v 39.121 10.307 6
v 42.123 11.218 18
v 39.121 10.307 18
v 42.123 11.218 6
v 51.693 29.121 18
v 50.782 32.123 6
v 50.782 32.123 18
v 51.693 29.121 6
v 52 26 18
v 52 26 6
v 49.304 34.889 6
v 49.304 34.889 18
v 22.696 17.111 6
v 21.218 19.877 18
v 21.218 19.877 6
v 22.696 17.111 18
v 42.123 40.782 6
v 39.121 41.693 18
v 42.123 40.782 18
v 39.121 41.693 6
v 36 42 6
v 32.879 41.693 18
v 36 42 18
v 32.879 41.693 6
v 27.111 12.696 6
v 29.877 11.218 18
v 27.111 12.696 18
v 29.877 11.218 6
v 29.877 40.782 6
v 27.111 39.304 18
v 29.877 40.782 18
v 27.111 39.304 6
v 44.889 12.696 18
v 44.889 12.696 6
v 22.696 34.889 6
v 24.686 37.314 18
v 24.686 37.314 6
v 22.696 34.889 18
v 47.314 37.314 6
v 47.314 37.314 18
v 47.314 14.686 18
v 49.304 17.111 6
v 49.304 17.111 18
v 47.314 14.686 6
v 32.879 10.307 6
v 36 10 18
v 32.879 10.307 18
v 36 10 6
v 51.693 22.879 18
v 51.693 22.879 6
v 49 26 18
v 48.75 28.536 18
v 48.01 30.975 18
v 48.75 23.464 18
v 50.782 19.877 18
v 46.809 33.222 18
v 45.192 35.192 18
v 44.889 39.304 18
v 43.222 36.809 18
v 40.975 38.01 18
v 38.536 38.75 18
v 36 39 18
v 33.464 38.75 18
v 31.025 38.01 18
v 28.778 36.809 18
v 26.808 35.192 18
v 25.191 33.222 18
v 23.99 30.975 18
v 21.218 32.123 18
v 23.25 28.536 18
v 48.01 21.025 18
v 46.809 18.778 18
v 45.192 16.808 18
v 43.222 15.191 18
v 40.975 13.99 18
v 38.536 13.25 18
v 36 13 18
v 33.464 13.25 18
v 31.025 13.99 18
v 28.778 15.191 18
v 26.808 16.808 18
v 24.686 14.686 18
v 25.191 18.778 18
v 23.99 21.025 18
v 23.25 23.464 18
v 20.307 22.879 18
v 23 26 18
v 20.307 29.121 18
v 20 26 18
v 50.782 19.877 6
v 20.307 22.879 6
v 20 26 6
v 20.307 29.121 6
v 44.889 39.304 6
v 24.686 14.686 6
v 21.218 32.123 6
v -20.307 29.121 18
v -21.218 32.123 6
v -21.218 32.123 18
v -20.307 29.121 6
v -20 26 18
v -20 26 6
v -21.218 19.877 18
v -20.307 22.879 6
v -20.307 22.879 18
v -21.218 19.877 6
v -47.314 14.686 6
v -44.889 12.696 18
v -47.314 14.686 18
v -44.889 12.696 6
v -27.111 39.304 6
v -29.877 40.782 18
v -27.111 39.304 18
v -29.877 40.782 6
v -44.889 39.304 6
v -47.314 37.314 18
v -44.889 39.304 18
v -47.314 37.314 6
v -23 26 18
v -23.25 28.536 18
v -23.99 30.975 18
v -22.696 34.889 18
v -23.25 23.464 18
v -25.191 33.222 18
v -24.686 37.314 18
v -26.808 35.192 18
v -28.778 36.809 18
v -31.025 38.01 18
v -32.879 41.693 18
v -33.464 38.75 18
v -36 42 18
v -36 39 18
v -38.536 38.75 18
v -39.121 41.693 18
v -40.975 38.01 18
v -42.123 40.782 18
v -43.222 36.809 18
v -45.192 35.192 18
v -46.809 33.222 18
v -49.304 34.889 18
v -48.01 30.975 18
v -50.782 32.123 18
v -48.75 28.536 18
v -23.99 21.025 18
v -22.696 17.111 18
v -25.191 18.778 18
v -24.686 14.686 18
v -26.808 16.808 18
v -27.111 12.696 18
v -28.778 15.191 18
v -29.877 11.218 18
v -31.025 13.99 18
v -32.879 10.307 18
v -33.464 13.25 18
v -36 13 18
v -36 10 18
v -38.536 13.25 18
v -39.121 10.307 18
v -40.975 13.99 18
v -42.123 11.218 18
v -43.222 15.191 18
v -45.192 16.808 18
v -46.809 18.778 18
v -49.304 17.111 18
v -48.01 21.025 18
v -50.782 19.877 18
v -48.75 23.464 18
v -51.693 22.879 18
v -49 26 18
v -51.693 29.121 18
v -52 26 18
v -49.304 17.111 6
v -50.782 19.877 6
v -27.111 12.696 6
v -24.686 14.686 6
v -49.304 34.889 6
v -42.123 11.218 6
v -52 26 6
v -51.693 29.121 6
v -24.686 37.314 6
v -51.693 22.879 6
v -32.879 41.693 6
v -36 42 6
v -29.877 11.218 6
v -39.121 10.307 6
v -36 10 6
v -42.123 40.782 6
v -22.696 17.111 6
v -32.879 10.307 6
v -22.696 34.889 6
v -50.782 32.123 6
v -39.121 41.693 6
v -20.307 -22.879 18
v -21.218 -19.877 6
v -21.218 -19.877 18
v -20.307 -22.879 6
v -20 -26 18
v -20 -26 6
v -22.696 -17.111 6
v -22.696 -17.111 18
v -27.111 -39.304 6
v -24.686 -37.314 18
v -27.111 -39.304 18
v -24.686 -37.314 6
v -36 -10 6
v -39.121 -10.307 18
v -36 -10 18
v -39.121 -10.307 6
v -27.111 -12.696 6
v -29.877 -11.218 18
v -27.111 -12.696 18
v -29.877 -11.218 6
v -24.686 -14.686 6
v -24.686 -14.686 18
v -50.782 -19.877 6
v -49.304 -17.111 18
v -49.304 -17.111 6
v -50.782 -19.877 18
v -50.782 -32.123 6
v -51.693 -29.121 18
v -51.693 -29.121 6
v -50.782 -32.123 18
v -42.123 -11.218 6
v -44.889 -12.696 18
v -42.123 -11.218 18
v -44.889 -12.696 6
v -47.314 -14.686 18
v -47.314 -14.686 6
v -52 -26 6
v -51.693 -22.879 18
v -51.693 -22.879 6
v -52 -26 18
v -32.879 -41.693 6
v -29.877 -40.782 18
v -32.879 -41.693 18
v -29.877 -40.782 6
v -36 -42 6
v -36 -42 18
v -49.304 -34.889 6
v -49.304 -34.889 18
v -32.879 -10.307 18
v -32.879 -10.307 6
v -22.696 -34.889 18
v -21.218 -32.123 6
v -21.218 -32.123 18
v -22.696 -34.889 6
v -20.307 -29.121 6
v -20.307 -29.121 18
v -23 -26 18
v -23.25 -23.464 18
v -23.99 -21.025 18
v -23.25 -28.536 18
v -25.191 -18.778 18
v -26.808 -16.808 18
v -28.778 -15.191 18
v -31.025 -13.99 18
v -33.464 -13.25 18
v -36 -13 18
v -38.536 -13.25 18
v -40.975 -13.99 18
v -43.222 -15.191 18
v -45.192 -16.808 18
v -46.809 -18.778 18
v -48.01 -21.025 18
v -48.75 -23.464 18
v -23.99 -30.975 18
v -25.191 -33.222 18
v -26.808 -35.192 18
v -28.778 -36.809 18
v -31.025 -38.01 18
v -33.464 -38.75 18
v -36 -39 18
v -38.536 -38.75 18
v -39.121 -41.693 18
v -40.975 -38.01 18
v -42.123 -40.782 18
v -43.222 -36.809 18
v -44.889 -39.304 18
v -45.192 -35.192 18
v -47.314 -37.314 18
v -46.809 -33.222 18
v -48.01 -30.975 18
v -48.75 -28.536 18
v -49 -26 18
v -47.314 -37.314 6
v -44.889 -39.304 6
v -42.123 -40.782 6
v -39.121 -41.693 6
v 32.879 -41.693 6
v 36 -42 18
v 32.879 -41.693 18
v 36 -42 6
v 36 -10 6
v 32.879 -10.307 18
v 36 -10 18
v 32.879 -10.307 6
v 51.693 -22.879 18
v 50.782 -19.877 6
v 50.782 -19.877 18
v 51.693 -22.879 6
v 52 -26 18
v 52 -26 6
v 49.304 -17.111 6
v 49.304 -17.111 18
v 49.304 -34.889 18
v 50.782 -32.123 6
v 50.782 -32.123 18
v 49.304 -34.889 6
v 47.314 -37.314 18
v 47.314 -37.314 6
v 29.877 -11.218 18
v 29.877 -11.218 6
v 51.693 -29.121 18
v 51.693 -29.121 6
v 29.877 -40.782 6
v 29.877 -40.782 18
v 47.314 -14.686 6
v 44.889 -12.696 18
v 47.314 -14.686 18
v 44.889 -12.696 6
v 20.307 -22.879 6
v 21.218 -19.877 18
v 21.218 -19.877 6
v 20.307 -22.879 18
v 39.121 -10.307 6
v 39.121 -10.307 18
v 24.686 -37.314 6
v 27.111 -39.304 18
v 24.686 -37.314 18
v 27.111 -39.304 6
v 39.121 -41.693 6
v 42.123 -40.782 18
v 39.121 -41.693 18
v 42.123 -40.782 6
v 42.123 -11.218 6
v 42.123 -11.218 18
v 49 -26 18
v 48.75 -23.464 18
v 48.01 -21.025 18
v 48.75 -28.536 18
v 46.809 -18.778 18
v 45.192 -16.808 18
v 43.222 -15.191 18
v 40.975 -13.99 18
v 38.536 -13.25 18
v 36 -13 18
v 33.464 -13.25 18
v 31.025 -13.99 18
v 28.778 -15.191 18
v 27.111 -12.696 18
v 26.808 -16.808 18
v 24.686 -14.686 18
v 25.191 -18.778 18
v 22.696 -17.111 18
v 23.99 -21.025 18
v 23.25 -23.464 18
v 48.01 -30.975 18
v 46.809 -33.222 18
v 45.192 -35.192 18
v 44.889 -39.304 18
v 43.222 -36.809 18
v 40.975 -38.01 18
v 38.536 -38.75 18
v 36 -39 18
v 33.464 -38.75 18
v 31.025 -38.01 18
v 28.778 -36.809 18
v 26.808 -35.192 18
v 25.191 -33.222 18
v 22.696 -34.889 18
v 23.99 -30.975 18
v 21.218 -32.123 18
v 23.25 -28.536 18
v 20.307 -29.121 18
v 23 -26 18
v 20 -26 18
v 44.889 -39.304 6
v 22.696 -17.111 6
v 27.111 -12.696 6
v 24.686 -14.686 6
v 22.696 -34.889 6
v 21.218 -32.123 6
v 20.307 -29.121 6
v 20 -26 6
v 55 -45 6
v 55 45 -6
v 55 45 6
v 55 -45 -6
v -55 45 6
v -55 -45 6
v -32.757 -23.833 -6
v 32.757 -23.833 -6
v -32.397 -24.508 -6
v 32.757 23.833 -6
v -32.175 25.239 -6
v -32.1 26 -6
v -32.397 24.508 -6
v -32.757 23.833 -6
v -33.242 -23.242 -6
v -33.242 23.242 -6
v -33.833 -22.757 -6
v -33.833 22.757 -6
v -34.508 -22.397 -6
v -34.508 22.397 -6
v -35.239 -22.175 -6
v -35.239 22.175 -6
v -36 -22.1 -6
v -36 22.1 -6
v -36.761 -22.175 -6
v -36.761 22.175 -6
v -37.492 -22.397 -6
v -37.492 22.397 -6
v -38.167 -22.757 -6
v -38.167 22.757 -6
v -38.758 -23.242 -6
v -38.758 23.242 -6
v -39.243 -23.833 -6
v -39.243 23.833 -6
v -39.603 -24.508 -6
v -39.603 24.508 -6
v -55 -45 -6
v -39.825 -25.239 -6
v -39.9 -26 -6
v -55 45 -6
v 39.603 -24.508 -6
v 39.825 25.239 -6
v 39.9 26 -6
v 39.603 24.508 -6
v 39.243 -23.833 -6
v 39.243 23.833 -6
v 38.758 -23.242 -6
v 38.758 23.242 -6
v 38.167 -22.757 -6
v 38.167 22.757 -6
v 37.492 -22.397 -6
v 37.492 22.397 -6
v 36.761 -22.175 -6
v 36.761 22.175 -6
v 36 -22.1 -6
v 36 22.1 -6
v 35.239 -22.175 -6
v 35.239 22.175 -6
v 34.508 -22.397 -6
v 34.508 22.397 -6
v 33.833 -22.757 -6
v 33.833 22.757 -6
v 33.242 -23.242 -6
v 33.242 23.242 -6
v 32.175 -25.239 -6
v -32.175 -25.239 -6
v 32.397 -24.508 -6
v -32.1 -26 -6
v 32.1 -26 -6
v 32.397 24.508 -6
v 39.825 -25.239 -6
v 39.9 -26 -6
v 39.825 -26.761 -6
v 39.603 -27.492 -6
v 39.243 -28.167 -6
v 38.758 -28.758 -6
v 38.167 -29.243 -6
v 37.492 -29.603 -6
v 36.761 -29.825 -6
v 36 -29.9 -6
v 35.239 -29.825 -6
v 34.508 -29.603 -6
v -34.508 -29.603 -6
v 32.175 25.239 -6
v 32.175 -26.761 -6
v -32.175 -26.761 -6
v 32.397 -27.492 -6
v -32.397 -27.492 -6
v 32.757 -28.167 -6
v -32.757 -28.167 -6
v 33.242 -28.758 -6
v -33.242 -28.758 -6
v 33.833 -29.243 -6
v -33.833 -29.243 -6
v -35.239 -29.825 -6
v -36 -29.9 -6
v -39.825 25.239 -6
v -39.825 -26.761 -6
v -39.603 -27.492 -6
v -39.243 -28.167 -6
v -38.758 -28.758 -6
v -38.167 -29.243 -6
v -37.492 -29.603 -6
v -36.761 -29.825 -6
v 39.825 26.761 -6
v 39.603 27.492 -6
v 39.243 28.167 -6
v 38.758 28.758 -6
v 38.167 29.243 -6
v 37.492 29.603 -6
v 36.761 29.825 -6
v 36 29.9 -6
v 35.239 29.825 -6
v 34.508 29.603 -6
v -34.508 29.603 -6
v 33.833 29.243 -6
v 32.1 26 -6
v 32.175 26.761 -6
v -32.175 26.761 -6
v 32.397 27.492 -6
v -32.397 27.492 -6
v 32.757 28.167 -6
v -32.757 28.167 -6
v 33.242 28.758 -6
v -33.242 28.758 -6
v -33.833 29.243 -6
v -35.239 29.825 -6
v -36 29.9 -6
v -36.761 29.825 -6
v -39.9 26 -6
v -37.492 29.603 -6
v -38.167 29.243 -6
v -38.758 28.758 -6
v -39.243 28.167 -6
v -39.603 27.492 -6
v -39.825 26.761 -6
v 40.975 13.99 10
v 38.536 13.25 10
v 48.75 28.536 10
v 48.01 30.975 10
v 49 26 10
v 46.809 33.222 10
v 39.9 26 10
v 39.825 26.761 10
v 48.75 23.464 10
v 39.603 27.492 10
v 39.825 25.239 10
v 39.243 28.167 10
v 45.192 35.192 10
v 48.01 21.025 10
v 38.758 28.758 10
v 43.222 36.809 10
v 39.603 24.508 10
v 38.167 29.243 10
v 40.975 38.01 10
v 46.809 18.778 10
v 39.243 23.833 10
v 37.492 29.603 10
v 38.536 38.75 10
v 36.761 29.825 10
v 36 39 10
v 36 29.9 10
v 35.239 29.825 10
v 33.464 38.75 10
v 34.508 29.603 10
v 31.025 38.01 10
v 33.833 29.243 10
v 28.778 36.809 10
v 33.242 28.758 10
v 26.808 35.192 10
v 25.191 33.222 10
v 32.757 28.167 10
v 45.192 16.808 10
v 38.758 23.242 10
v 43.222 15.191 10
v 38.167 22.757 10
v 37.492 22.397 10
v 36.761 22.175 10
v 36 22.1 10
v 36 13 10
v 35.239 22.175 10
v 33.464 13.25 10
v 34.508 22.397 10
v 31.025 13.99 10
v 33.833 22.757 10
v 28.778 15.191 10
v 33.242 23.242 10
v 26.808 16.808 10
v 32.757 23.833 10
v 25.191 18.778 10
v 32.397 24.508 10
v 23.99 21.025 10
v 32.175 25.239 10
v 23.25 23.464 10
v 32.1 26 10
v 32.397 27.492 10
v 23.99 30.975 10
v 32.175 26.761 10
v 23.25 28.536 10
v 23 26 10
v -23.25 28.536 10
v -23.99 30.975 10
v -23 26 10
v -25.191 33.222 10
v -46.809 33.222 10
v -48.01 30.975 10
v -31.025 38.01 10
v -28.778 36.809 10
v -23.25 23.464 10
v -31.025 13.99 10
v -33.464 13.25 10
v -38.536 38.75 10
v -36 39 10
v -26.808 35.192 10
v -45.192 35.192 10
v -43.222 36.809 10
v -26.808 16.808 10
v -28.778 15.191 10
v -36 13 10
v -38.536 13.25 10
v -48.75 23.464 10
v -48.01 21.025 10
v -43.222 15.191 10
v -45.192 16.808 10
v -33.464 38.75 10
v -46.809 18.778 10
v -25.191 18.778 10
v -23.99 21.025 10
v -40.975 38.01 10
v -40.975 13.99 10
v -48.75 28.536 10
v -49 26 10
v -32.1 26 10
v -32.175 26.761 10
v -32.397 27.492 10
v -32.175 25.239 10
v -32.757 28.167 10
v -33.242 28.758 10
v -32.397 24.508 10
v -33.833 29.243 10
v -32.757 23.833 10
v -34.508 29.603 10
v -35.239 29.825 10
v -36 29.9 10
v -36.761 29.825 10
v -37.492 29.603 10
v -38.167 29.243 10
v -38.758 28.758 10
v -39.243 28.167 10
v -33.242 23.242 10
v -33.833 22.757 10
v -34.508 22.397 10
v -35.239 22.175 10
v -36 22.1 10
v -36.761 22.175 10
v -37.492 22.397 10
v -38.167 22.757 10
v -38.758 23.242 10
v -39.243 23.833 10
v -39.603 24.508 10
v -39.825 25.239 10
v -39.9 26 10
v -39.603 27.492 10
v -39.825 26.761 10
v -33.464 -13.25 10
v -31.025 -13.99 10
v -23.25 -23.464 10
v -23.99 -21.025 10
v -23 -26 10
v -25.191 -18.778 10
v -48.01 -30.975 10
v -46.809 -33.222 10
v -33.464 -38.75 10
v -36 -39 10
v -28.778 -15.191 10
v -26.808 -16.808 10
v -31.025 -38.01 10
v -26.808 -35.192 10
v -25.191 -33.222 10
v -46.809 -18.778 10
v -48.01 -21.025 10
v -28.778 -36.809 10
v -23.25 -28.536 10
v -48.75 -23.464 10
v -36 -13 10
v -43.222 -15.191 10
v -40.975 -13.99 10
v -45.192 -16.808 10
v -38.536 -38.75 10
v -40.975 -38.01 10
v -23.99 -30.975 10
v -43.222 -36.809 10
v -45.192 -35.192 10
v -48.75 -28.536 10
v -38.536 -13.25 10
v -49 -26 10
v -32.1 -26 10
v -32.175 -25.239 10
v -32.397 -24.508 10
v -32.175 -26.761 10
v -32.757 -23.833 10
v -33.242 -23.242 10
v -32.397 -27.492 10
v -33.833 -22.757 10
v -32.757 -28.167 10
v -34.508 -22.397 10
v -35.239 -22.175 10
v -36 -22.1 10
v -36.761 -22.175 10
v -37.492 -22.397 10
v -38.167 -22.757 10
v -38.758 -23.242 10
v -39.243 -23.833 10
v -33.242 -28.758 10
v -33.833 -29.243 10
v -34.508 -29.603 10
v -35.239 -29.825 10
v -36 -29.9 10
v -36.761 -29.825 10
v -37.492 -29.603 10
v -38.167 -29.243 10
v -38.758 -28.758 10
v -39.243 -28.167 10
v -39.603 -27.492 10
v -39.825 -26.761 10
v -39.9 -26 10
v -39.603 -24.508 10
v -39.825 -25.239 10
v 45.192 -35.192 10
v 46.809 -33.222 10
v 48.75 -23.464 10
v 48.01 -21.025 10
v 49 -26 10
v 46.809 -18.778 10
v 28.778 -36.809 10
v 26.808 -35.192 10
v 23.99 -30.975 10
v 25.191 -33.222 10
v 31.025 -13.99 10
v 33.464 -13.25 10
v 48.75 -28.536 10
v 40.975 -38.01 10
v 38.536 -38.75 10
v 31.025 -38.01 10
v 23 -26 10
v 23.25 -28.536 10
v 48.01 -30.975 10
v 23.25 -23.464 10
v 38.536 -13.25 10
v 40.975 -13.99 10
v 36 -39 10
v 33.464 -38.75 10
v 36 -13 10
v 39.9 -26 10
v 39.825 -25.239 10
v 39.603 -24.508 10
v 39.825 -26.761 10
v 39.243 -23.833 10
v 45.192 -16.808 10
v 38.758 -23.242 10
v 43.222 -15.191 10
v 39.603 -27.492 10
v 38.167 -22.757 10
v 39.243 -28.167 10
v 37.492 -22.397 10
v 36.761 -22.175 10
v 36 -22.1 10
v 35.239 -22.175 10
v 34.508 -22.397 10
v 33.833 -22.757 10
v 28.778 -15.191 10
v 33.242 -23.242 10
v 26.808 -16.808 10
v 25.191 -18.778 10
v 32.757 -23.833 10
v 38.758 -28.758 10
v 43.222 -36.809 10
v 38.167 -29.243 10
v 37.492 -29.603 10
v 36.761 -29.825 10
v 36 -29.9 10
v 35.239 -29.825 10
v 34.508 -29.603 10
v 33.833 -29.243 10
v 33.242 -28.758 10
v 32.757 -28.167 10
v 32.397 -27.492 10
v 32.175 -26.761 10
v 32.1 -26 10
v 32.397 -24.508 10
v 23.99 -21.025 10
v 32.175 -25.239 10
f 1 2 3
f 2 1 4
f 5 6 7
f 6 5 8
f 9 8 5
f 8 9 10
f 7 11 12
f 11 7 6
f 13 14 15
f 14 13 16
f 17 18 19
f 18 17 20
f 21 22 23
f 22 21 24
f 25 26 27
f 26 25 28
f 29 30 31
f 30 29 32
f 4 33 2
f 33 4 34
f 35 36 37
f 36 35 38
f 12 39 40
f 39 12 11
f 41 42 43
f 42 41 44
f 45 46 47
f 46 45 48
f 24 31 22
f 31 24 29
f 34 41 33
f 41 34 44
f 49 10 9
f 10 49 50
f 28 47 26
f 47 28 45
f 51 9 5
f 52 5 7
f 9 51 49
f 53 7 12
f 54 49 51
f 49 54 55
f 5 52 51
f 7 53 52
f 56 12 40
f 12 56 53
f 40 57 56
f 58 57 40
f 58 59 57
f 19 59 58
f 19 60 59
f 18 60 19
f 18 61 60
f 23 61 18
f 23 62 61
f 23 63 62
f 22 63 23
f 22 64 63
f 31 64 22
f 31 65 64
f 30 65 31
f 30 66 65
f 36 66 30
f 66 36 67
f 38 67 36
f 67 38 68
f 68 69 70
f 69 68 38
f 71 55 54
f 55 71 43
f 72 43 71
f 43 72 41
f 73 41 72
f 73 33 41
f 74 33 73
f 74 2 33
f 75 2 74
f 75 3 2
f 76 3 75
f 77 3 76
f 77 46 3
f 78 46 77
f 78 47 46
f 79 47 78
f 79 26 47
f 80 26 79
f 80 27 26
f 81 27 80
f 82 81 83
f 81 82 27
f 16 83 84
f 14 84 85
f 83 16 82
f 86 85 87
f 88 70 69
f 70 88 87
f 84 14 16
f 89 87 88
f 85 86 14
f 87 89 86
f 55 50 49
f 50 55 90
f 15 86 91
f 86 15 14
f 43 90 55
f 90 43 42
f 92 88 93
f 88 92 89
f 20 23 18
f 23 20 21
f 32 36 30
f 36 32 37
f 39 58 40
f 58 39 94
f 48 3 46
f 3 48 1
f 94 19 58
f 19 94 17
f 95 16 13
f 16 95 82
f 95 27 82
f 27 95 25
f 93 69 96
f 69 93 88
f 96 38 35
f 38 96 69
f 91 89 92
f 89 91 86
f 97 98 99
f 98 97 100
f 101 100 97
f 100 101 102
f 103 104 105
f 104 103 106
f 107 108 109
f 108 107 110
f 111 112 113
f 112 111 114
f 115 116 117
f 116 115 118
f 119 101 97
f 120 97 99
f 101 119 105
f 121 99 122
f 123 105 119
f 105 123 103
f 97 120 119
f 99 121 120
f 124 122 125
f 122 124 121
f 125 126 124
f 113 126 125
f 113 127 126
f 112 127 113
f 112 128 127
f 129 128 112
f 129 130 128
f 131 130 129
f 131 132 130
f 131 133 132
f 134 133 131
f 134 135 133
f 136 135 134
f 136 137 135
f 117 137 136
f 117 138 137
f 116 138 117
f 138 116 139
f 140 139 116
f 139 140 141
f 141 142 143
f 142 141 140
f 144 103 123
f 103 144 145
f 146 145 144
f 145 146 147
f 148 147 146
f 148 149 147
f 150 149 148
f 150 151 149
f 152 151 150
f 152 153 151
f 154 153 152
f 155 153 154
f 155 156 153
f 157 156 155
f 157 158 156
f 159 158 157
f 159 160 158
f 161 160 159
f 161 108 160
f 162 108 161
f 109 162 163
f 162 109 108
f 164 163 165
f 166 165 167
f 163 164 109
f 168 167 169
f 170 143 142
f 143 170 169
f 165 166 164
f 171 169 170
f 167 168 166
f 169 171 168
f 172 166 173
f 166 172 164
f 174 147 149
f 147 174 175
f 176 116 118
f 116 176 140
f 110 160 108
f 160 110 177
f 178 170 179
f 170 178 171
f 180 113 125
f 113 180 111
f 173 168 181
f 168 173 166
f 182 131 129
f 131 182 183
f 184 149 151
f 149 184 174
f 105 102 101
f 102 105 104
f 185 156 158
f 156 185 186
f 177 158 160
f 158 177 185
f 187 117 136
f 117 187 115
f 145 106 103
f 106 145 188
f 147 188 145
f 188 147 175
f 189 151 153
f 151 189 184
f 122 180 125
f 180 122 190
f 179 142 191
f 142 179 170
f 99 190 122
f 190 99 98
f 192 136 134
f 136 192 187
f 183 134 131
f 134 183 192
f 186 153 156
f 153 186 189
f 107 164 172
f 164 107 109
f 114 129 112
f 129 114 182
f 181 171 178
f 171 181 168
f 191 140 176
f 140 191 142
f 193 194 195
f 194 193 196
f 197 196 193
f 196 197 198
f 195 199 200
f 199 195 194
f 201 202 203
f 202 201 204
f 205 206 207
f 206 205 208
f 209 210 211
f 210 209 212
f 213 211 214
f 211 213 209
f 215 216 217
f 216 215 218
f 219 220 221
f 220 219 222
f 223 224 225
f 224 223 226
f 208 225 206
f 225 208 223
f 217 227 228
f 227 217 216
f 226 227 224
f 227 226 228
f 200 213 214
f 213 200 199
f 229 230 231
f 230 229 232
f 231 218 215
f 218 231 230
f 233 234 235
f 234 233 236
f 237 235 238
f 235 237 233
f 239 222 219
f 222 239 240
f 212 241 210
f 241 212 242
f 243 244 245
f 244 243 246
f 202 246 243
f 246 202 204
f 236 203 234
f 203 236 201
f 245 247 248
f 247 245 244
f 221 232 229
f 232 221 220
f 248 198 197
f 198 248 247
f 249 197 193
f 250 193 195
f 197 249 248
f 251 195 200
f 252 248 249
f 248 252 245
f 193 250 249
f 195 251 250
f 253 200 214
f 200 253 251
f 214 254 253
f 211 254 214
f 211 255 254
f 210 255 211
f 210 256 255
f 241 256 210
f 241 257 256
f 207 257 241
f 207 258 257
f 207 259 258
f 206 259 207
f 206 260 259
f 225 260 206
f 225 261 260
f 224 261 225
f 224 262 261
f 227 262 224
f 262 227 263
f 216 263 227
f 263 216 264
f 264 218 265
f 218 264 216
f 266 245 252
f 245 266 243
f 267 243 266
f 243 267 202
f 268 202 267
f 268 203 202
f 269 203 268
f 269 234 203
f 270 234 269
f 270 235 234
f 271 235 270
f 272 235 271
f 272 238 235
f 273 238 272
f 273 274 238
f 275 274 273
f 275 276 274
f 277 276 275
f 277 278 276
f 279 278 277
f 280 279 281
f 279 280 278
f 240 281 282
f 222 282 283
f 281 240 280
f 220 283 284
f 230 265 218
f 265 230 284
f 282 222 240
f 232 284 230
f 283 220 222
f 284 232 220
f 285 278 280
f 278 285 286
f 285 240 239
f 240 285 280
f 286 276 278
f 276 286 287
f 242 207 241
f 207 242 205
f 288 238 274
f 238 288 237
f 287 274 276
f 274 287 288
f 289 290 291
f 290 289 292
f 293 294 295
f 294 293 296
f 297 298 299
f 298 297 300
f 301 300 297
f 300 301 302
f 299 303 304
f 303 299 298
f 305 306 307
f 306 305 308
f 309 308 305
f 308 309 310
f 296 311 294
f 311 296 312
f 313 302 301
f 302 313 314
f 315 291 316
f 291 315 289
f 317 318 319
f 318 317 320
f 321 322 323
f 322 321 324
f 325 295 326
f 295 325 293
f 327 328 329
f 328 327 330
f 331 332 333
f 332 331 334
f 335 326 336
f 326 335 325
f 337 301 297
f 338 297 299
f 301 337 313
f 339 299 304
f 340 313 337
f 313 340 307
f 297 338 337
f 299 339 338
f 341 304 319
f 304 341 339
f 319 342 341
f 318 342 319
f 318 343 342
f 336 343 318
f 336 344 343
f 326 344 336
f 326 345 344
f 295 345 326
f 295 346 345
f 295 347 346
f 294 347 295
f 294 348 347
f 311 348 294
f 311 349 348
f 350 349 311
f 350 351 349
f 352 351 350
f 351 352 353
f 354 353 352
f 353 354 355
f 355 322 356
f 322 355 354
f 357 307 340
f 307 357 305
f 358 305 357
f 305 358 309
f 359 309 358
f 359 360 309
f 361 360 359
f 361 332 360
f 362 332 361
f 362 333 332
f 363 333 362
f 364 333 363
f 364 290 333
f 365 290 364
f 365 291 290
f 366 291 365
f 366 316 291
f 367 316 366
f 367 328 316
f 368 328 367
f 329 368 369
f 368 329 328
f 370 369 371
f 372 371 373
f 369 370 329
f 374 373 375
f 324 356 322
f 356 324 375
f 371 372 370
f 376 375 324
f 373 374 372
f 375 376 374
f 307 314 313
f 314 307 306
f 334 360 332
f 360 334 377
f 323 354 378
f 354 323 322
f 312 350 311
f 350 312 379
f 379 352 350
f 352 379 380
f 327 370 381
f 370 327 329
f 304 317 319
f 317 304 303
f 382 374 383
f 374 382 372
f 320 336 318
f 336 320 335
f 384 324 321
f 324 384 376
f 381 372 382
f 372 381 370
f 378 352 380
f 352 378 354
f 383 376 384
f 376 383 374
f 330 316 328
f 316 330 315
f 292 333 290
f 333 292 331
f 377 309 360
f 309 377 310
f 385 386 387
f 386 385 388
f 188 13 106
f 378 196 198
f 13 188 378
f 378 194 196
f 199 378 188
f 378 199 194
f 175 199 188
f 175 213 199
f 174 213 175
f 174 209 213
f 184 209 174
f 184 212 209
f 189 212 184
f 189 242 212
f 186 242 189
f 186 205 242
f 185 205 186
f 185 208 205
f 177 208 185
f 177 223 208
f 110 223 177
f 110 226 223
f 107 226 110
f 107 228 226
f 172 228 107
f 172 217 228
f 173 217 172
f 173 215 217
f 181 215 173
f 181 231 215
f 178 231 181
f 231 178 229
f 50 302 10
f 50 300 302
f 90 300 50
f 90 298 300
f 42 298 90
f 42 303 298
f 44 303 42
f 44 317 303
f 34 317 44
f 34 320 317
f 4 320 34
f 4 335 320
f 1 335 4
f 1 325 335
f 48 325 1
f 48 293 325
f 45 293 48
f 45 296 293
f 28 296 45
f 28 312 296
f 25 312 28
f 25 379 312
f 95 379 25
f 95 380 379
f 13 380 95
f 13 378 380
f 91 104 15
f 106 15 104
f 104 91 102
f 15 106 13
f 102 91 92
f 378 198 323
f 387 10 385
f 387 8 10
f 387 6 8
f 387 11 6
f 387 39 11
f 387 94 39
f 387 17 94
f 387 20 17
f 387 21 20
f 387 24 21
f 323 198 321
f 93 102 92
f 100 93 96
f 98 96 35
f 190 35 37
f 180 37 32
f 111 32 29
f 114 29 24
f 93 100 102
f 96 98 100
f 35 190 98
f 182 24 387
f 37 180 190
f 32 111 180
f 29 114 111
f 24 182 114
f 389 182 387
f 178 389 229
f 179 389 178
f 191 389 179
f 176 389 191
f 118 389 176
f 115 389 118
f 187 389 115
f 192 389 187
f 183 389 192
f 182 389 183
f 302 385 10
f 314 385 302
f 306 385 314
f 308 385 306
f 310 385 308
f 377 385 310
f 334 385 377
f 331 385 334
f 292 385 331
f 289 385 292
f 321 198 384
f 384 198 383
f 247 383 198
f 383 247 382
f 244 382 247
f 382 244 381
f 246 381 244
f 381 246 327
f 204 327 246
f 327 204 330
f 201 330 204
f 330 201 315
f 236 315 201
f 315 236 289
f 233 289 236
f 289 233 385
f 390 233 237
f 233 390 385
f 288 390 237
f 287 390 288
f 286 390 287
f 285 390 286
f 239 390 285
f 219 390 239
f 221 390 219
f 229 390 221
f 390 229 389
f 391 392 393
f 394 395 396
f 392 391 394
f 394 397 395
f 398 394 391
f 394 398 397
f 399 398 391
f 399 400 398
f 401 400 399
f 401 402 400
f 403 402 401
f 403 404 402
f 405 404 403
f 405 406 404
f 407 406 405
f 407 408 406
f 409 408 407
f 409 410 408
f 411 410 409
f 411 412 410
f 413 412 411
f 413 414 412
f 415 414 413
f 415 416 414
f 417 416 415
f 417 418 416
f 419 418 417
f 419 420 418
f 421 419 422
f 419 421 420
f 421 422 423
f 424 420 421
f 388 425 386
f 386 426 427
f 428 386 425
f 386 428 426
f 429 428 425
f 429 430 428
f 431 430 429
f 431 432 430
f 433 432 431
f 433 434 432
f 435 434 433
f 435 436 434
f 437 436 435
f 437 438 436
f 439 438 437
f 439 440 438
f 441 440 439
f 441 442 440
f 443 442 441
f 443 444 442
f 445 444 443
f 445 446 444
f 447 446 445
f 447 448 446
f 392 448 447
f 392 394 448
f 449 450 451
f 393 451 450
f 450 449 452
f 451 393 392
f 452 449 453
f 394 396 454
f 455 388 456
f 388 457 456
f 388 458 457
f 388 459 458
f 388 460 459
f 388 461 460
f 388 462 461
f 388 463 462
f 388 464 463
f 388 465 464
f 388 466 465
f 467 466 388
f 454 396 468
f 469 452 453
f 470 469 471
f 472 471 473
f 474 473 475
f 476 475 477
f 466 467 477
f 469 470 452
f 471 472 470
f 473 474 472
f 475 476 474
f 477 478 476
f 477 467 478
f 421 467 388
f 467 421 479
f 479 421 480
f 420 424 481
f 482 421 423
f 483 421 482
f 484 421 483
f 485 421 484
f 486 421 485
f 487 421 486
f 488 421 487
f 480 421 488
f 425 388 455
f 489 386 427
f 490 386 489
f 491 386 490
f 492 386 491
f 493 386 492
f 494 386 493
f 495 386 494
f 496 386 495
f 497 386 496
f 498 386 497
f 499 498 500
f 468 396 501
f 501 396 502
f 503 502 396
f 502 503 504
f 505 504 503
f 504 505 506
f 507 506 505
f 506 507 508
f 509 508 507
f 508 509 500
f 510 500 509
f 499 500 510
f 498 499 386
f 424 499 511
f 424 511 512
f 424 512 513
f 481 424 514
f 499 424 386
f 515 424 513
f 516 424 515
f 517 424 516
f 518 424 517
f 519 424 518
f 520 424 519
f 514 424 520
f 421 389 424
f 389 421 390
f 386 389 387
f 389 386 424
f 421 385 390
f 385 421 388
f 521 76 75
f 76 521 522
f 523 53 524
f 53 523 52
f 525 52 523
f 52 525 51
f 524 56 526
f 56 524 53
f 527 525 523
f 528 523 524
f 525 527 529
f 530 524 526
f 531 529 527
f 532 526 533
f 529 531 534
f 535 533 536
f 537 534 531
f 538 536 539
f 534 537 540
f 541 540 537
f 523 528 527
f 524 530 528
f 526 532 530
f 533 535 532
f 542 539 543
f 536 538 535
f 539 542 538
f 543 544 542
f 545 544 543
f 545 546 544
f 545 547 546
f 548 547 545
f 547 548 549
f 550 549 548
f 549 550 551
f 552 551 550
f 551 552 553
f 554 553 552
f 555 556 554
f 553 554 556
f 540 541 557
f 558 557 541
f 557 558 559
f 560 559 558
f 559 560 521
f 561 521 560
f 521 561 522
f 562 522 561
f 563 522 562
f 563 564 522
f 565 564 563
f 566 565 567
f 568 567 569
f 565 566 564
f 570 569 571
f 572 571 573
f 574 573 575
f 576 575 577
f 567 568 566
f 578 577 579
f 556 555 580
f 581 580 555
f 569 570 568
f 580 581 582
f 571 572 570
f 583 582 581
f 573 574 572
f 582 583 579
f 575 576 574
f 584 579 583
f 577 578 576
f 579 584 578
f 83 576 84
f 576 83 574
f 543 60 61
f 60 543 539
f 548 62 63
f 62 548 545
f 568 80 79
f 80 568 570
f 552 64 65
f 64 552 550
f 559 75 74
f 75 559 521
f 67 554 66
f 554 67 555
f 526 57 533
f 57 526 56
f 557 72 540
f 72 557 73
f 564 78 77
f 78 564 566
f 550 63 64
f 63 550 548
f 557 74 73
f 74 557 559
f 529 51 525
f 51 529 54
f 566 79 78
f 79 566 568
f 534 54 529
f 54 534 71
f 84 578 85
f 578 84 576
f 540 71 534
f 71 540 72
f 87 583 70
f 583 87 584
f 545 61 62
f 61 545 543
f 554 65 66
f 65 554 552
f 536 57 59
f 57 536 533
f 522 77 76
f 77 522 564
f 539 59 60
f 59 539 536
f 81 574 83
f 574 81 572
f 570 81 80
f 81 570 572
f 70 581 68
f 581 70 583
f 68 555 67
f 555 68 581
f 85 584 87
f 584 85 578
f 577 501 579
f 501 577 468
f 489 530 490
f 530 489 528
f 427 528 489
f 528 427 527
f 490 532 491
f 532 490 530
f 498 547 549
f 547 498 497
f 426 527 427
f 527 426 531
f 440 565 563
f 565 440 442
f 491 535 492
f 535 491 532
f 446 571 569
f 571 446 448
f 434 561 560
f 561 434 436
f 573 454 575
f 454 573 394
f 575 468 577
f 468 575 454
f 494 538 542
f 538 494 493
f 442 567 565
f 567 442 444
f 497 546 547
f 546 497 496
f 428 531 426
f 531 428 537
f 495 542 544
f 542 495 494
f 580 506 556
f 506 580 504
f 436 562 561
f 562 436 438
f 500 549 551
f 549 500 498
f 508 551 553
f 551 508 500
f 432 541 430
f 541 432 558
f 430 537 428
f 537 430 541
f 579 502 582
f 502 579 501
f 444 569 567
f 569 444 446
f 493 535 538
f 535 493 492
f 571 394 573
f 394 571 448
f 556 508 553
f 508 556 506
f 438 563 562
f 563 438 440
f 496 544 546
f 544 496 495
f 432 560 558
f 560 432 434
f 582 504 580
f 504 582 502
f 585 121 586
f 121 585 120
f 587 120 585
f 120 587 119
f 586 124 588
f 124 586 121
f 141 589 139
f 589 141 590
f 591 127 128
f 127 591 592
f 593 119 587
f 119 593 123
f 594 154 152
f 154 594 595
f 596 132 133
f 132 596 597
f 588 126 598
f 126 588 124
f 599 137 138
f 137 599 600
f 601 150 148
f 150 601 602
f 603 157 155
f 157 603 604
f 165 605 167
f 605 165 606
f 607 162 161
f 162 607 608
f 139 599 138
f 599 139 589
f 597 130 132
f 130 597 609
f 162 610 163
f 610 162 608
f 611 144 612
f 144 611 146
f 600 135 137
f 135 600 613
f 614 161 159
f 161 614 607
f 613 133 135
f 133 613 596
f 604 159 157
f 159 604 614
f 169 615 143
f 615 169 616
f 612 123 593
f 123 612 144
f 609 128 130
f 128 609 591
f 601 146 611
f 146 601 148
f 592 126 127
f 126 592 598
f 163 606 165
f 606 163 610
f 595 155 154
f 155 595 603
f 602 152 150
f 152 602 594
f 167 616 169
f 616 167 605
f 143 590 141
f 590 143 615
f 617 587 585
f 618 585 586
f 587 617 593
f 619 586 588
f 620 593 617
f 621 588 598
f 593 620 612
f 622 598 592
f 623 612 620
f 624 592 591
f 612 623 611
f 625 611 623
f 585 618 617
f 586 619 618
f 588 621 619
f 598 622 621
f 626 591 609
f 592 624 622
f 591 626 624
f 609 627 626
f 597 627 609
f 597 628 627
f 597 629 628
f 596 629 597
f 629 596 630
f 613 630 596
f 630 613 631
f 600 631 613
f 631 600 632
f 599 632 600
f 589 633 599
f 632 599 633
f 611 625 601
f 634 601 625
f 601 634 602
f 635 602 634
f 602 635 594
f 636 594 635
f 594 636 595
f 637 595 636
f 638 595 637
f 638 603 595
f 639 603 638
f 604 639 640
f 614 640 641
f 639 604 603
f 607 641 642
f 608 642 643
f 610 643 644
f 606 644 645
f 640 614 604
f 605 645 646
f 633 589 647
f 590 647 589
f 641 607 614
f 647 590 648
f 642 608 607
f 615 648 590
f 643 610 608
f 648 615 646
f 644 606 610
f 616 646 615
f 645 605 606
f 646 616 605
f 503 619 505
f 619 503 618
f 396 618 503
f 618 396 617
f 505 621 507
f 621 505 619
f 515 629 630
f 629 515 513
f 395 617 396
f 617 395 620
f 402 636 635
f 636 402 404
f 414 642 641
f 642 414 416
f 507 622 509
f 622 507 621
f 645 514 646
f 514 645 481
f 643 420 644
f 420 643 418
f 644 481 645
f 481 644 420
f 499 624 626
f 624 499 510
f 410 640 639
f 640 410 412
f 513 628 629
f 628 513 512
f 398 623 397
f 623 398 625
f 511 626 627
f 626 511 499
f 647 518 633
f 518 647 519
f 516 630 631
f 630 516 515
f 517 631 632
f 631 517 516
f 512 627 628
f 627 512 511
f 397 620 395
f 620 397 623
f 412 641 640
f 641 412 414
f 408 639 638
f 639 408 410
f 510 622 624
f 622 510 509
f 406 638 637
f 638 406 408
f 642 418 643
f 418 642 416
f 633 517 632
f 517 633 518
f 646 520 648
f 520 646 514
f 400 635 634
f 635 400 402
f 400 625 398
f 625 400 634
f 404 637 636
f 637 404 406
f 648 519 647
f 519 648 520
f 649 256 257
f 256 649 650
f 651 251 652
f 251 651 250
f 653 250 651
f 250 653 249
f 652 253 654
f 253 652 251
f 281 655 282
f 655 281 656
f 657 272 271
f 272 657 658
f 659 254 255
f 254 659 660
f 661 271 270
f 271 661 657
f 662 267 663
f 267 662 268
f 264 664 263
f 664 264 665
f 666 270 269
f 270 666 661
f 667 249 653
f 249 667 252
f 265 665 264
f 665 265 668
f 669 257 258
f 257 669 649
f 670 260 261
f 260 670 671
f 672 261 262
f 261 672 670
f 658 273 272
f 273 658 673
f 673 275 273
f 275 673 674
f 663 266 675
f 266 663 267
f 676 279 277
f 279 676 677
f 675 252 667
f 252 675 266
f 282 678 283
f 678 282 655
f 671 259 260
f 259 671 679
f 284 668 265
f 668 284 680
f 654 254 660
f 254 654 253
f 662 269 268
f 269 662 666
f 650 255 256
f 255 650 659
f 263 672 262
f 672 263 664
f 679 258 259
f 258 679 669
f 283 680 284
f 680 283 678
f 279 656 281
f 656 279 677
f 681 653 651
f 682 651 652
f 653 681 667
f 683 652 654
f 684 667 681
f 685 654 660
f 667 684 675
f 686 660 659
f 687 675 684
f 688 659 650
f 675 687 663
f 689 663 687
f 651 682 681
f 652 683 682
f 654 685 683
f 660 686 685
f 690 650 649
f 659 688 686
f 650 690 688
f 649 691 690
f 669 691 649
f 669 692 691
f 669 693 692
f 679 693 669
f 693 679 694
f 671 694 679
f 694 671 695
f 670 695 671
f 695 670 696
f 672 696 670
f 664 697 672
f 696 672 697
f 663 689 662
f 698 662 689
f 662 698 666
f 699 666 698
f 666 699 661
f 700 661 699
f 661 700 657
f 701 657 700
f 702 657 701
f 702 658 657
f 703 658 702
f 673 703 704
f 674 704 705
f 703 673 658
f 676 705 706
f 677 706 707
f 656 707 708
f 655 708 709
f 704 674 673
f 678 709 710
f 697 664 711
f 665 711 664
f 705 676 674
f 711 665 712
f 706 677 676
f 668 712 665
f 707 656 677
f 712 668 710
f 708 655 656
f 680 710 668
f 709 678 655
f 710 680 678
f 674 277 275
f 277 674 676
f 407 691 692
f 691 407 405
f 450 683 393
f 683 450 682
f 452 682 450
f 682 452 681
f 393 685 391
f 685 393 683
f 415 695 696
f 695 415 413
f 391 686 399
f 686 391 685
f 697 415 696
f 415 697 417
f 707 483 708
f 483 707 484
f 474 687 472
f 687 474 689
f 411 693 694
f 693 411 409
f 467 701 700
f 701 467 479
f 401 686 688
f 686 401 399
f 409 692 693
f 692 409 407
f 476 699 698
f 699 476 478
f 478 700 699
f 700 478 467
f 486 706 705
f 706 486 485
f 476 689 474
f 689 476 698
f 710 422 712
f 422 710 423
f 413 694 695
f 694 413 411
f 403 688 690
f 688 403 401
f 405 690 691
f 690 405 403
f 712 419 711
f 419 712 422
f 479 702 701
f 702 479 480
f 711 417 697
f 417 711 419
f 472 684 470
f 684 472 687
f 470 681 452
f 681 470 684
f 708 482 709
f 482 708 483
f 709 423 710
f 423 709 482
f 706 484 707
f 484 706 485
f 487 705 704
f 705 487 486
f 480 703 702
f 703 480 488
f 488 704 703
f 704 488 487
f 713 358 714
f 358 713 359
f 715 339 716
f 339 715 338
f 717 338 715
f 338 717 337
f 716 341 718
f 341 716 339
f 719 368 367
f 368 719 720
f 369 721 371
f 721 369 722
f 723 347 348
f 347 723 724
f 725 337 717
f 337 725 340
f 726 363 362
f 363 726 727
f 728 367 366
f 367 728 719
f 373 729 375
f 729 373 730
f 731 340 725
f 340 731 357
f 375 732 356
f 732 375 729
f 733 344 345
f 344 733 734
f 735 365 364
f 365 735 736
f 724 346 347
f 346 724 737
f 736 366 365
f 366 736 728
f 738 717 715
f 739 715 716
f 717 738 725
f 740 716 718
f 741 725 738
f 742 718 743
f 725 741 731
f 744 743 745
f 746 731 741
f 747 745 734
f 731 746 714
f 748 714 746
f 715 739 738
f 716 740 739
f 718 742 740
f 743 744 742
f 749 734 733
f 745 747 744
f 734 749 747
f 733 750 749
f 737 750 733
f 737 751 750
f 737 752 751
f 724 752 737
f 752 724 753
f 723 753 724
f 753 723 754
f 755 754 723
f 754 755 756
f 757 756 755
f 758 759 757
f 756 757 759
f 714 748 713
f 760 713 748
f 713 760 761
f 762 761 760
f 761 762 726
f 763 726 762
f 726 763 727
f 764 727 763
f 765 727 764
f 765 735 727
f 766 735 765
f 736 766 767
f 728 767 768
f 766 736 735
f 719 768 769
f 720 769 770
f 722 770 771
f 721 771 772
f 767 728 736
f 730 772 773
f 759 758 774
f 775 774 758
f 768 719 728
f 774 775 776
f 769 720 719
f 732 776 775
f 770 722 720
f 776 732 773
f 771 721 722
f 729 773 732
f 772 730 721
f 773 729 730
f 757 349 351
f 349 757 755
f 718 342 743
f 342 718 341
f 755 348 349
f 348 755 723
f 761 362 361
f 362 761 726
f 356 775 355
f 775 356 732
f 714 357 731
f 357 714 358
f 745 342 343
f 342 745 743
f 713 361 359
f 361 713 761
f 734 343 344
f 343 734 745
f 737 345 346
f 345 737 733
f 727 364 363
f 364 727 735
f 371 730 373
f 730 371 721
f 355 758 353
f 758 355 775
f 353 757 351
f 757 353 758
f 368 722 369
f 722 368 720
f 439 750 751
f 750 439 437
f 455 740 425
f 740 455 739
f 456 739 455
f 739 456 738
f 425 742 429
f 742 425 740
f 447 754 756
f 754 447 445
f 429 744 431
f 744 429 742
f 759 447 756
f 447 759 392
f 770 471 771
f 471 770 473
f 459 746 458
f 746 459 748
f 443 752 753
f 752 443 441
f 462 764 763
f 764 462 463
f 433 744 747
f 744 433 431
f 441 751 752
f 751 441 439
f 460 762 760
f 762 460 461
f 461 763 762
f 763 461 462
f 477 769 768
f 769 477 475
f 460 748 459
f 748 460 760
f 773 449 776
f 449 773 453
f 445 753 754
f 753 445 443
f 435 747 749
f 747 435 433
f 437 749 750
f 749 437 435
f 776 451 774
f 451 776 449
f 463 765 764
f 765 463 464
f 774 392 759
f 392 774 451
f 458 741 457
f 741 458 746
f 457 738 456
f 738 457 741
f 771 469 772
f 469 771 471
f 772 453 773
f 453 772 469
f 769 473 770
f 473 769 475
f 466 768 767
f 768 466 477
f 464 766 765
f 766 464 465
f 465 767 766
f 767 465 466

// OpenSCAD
$fn = 32;

// ----------------------------------------------------------------------
// Socket pad plate
// bosses with counterbored sockets for the screws
// ----------------------------------------------------------------------

// --- parameters (mm) ---
base_t = 12;            // base plate thickness
boss_h = 12;            // boss height above the base plate
boss_d = 32;            // boss diameter
socket_d = 26;          // socket diameter
socket_depth = 8;       // socket depth from the boss face
bolt_d = 7.8;           // screw clearance hole through the socket floor
plate = [110, 90, 12];  // overall size (x, y, z)
edge = 19;              // boss centre offset from the plate edge
pads = 4;               // boss count, one per corner

// --- derived feature positions (mm) ---
height = base_t + boss_h;        // = 24   overall height of the part
corner_x = plate[0] / 2 - edge;  // = 36   boss centre X
corner_y = plate[1] / 2 - edge;  // = 26   boss centre Y
feature_centers = [
  [corner_x, corner_y],
  [-corner_x, corner_y],
  [-corner_x, -corner_y],
  [corner_x, -corner_y]
];   // boss centres: sockets, holes and the pads themselves are placed from here

// base plate, bosses on feature_centers, socket + through hole in each
difference() {
  union() {
    cube(plate, center = true);
    for (centre = feature_centers)
      translate([centre[0], centre[1], plate[2] / 2 - 1])
        cylinder(d = boss_d, h = boss_h + 1);
  }
  for (centre = feature_centers) {
    translate([centre[0], centre[1], plate[2] / 2 + boss_h - socket_depth])
      cylinder(d = socket_d, h = socket_depth + 1);
    translate([centre[0], centre[1], -height])
      cylinder(d = bolt_d, h = 2 * height + 2);  // through the socket floor
  }
}
